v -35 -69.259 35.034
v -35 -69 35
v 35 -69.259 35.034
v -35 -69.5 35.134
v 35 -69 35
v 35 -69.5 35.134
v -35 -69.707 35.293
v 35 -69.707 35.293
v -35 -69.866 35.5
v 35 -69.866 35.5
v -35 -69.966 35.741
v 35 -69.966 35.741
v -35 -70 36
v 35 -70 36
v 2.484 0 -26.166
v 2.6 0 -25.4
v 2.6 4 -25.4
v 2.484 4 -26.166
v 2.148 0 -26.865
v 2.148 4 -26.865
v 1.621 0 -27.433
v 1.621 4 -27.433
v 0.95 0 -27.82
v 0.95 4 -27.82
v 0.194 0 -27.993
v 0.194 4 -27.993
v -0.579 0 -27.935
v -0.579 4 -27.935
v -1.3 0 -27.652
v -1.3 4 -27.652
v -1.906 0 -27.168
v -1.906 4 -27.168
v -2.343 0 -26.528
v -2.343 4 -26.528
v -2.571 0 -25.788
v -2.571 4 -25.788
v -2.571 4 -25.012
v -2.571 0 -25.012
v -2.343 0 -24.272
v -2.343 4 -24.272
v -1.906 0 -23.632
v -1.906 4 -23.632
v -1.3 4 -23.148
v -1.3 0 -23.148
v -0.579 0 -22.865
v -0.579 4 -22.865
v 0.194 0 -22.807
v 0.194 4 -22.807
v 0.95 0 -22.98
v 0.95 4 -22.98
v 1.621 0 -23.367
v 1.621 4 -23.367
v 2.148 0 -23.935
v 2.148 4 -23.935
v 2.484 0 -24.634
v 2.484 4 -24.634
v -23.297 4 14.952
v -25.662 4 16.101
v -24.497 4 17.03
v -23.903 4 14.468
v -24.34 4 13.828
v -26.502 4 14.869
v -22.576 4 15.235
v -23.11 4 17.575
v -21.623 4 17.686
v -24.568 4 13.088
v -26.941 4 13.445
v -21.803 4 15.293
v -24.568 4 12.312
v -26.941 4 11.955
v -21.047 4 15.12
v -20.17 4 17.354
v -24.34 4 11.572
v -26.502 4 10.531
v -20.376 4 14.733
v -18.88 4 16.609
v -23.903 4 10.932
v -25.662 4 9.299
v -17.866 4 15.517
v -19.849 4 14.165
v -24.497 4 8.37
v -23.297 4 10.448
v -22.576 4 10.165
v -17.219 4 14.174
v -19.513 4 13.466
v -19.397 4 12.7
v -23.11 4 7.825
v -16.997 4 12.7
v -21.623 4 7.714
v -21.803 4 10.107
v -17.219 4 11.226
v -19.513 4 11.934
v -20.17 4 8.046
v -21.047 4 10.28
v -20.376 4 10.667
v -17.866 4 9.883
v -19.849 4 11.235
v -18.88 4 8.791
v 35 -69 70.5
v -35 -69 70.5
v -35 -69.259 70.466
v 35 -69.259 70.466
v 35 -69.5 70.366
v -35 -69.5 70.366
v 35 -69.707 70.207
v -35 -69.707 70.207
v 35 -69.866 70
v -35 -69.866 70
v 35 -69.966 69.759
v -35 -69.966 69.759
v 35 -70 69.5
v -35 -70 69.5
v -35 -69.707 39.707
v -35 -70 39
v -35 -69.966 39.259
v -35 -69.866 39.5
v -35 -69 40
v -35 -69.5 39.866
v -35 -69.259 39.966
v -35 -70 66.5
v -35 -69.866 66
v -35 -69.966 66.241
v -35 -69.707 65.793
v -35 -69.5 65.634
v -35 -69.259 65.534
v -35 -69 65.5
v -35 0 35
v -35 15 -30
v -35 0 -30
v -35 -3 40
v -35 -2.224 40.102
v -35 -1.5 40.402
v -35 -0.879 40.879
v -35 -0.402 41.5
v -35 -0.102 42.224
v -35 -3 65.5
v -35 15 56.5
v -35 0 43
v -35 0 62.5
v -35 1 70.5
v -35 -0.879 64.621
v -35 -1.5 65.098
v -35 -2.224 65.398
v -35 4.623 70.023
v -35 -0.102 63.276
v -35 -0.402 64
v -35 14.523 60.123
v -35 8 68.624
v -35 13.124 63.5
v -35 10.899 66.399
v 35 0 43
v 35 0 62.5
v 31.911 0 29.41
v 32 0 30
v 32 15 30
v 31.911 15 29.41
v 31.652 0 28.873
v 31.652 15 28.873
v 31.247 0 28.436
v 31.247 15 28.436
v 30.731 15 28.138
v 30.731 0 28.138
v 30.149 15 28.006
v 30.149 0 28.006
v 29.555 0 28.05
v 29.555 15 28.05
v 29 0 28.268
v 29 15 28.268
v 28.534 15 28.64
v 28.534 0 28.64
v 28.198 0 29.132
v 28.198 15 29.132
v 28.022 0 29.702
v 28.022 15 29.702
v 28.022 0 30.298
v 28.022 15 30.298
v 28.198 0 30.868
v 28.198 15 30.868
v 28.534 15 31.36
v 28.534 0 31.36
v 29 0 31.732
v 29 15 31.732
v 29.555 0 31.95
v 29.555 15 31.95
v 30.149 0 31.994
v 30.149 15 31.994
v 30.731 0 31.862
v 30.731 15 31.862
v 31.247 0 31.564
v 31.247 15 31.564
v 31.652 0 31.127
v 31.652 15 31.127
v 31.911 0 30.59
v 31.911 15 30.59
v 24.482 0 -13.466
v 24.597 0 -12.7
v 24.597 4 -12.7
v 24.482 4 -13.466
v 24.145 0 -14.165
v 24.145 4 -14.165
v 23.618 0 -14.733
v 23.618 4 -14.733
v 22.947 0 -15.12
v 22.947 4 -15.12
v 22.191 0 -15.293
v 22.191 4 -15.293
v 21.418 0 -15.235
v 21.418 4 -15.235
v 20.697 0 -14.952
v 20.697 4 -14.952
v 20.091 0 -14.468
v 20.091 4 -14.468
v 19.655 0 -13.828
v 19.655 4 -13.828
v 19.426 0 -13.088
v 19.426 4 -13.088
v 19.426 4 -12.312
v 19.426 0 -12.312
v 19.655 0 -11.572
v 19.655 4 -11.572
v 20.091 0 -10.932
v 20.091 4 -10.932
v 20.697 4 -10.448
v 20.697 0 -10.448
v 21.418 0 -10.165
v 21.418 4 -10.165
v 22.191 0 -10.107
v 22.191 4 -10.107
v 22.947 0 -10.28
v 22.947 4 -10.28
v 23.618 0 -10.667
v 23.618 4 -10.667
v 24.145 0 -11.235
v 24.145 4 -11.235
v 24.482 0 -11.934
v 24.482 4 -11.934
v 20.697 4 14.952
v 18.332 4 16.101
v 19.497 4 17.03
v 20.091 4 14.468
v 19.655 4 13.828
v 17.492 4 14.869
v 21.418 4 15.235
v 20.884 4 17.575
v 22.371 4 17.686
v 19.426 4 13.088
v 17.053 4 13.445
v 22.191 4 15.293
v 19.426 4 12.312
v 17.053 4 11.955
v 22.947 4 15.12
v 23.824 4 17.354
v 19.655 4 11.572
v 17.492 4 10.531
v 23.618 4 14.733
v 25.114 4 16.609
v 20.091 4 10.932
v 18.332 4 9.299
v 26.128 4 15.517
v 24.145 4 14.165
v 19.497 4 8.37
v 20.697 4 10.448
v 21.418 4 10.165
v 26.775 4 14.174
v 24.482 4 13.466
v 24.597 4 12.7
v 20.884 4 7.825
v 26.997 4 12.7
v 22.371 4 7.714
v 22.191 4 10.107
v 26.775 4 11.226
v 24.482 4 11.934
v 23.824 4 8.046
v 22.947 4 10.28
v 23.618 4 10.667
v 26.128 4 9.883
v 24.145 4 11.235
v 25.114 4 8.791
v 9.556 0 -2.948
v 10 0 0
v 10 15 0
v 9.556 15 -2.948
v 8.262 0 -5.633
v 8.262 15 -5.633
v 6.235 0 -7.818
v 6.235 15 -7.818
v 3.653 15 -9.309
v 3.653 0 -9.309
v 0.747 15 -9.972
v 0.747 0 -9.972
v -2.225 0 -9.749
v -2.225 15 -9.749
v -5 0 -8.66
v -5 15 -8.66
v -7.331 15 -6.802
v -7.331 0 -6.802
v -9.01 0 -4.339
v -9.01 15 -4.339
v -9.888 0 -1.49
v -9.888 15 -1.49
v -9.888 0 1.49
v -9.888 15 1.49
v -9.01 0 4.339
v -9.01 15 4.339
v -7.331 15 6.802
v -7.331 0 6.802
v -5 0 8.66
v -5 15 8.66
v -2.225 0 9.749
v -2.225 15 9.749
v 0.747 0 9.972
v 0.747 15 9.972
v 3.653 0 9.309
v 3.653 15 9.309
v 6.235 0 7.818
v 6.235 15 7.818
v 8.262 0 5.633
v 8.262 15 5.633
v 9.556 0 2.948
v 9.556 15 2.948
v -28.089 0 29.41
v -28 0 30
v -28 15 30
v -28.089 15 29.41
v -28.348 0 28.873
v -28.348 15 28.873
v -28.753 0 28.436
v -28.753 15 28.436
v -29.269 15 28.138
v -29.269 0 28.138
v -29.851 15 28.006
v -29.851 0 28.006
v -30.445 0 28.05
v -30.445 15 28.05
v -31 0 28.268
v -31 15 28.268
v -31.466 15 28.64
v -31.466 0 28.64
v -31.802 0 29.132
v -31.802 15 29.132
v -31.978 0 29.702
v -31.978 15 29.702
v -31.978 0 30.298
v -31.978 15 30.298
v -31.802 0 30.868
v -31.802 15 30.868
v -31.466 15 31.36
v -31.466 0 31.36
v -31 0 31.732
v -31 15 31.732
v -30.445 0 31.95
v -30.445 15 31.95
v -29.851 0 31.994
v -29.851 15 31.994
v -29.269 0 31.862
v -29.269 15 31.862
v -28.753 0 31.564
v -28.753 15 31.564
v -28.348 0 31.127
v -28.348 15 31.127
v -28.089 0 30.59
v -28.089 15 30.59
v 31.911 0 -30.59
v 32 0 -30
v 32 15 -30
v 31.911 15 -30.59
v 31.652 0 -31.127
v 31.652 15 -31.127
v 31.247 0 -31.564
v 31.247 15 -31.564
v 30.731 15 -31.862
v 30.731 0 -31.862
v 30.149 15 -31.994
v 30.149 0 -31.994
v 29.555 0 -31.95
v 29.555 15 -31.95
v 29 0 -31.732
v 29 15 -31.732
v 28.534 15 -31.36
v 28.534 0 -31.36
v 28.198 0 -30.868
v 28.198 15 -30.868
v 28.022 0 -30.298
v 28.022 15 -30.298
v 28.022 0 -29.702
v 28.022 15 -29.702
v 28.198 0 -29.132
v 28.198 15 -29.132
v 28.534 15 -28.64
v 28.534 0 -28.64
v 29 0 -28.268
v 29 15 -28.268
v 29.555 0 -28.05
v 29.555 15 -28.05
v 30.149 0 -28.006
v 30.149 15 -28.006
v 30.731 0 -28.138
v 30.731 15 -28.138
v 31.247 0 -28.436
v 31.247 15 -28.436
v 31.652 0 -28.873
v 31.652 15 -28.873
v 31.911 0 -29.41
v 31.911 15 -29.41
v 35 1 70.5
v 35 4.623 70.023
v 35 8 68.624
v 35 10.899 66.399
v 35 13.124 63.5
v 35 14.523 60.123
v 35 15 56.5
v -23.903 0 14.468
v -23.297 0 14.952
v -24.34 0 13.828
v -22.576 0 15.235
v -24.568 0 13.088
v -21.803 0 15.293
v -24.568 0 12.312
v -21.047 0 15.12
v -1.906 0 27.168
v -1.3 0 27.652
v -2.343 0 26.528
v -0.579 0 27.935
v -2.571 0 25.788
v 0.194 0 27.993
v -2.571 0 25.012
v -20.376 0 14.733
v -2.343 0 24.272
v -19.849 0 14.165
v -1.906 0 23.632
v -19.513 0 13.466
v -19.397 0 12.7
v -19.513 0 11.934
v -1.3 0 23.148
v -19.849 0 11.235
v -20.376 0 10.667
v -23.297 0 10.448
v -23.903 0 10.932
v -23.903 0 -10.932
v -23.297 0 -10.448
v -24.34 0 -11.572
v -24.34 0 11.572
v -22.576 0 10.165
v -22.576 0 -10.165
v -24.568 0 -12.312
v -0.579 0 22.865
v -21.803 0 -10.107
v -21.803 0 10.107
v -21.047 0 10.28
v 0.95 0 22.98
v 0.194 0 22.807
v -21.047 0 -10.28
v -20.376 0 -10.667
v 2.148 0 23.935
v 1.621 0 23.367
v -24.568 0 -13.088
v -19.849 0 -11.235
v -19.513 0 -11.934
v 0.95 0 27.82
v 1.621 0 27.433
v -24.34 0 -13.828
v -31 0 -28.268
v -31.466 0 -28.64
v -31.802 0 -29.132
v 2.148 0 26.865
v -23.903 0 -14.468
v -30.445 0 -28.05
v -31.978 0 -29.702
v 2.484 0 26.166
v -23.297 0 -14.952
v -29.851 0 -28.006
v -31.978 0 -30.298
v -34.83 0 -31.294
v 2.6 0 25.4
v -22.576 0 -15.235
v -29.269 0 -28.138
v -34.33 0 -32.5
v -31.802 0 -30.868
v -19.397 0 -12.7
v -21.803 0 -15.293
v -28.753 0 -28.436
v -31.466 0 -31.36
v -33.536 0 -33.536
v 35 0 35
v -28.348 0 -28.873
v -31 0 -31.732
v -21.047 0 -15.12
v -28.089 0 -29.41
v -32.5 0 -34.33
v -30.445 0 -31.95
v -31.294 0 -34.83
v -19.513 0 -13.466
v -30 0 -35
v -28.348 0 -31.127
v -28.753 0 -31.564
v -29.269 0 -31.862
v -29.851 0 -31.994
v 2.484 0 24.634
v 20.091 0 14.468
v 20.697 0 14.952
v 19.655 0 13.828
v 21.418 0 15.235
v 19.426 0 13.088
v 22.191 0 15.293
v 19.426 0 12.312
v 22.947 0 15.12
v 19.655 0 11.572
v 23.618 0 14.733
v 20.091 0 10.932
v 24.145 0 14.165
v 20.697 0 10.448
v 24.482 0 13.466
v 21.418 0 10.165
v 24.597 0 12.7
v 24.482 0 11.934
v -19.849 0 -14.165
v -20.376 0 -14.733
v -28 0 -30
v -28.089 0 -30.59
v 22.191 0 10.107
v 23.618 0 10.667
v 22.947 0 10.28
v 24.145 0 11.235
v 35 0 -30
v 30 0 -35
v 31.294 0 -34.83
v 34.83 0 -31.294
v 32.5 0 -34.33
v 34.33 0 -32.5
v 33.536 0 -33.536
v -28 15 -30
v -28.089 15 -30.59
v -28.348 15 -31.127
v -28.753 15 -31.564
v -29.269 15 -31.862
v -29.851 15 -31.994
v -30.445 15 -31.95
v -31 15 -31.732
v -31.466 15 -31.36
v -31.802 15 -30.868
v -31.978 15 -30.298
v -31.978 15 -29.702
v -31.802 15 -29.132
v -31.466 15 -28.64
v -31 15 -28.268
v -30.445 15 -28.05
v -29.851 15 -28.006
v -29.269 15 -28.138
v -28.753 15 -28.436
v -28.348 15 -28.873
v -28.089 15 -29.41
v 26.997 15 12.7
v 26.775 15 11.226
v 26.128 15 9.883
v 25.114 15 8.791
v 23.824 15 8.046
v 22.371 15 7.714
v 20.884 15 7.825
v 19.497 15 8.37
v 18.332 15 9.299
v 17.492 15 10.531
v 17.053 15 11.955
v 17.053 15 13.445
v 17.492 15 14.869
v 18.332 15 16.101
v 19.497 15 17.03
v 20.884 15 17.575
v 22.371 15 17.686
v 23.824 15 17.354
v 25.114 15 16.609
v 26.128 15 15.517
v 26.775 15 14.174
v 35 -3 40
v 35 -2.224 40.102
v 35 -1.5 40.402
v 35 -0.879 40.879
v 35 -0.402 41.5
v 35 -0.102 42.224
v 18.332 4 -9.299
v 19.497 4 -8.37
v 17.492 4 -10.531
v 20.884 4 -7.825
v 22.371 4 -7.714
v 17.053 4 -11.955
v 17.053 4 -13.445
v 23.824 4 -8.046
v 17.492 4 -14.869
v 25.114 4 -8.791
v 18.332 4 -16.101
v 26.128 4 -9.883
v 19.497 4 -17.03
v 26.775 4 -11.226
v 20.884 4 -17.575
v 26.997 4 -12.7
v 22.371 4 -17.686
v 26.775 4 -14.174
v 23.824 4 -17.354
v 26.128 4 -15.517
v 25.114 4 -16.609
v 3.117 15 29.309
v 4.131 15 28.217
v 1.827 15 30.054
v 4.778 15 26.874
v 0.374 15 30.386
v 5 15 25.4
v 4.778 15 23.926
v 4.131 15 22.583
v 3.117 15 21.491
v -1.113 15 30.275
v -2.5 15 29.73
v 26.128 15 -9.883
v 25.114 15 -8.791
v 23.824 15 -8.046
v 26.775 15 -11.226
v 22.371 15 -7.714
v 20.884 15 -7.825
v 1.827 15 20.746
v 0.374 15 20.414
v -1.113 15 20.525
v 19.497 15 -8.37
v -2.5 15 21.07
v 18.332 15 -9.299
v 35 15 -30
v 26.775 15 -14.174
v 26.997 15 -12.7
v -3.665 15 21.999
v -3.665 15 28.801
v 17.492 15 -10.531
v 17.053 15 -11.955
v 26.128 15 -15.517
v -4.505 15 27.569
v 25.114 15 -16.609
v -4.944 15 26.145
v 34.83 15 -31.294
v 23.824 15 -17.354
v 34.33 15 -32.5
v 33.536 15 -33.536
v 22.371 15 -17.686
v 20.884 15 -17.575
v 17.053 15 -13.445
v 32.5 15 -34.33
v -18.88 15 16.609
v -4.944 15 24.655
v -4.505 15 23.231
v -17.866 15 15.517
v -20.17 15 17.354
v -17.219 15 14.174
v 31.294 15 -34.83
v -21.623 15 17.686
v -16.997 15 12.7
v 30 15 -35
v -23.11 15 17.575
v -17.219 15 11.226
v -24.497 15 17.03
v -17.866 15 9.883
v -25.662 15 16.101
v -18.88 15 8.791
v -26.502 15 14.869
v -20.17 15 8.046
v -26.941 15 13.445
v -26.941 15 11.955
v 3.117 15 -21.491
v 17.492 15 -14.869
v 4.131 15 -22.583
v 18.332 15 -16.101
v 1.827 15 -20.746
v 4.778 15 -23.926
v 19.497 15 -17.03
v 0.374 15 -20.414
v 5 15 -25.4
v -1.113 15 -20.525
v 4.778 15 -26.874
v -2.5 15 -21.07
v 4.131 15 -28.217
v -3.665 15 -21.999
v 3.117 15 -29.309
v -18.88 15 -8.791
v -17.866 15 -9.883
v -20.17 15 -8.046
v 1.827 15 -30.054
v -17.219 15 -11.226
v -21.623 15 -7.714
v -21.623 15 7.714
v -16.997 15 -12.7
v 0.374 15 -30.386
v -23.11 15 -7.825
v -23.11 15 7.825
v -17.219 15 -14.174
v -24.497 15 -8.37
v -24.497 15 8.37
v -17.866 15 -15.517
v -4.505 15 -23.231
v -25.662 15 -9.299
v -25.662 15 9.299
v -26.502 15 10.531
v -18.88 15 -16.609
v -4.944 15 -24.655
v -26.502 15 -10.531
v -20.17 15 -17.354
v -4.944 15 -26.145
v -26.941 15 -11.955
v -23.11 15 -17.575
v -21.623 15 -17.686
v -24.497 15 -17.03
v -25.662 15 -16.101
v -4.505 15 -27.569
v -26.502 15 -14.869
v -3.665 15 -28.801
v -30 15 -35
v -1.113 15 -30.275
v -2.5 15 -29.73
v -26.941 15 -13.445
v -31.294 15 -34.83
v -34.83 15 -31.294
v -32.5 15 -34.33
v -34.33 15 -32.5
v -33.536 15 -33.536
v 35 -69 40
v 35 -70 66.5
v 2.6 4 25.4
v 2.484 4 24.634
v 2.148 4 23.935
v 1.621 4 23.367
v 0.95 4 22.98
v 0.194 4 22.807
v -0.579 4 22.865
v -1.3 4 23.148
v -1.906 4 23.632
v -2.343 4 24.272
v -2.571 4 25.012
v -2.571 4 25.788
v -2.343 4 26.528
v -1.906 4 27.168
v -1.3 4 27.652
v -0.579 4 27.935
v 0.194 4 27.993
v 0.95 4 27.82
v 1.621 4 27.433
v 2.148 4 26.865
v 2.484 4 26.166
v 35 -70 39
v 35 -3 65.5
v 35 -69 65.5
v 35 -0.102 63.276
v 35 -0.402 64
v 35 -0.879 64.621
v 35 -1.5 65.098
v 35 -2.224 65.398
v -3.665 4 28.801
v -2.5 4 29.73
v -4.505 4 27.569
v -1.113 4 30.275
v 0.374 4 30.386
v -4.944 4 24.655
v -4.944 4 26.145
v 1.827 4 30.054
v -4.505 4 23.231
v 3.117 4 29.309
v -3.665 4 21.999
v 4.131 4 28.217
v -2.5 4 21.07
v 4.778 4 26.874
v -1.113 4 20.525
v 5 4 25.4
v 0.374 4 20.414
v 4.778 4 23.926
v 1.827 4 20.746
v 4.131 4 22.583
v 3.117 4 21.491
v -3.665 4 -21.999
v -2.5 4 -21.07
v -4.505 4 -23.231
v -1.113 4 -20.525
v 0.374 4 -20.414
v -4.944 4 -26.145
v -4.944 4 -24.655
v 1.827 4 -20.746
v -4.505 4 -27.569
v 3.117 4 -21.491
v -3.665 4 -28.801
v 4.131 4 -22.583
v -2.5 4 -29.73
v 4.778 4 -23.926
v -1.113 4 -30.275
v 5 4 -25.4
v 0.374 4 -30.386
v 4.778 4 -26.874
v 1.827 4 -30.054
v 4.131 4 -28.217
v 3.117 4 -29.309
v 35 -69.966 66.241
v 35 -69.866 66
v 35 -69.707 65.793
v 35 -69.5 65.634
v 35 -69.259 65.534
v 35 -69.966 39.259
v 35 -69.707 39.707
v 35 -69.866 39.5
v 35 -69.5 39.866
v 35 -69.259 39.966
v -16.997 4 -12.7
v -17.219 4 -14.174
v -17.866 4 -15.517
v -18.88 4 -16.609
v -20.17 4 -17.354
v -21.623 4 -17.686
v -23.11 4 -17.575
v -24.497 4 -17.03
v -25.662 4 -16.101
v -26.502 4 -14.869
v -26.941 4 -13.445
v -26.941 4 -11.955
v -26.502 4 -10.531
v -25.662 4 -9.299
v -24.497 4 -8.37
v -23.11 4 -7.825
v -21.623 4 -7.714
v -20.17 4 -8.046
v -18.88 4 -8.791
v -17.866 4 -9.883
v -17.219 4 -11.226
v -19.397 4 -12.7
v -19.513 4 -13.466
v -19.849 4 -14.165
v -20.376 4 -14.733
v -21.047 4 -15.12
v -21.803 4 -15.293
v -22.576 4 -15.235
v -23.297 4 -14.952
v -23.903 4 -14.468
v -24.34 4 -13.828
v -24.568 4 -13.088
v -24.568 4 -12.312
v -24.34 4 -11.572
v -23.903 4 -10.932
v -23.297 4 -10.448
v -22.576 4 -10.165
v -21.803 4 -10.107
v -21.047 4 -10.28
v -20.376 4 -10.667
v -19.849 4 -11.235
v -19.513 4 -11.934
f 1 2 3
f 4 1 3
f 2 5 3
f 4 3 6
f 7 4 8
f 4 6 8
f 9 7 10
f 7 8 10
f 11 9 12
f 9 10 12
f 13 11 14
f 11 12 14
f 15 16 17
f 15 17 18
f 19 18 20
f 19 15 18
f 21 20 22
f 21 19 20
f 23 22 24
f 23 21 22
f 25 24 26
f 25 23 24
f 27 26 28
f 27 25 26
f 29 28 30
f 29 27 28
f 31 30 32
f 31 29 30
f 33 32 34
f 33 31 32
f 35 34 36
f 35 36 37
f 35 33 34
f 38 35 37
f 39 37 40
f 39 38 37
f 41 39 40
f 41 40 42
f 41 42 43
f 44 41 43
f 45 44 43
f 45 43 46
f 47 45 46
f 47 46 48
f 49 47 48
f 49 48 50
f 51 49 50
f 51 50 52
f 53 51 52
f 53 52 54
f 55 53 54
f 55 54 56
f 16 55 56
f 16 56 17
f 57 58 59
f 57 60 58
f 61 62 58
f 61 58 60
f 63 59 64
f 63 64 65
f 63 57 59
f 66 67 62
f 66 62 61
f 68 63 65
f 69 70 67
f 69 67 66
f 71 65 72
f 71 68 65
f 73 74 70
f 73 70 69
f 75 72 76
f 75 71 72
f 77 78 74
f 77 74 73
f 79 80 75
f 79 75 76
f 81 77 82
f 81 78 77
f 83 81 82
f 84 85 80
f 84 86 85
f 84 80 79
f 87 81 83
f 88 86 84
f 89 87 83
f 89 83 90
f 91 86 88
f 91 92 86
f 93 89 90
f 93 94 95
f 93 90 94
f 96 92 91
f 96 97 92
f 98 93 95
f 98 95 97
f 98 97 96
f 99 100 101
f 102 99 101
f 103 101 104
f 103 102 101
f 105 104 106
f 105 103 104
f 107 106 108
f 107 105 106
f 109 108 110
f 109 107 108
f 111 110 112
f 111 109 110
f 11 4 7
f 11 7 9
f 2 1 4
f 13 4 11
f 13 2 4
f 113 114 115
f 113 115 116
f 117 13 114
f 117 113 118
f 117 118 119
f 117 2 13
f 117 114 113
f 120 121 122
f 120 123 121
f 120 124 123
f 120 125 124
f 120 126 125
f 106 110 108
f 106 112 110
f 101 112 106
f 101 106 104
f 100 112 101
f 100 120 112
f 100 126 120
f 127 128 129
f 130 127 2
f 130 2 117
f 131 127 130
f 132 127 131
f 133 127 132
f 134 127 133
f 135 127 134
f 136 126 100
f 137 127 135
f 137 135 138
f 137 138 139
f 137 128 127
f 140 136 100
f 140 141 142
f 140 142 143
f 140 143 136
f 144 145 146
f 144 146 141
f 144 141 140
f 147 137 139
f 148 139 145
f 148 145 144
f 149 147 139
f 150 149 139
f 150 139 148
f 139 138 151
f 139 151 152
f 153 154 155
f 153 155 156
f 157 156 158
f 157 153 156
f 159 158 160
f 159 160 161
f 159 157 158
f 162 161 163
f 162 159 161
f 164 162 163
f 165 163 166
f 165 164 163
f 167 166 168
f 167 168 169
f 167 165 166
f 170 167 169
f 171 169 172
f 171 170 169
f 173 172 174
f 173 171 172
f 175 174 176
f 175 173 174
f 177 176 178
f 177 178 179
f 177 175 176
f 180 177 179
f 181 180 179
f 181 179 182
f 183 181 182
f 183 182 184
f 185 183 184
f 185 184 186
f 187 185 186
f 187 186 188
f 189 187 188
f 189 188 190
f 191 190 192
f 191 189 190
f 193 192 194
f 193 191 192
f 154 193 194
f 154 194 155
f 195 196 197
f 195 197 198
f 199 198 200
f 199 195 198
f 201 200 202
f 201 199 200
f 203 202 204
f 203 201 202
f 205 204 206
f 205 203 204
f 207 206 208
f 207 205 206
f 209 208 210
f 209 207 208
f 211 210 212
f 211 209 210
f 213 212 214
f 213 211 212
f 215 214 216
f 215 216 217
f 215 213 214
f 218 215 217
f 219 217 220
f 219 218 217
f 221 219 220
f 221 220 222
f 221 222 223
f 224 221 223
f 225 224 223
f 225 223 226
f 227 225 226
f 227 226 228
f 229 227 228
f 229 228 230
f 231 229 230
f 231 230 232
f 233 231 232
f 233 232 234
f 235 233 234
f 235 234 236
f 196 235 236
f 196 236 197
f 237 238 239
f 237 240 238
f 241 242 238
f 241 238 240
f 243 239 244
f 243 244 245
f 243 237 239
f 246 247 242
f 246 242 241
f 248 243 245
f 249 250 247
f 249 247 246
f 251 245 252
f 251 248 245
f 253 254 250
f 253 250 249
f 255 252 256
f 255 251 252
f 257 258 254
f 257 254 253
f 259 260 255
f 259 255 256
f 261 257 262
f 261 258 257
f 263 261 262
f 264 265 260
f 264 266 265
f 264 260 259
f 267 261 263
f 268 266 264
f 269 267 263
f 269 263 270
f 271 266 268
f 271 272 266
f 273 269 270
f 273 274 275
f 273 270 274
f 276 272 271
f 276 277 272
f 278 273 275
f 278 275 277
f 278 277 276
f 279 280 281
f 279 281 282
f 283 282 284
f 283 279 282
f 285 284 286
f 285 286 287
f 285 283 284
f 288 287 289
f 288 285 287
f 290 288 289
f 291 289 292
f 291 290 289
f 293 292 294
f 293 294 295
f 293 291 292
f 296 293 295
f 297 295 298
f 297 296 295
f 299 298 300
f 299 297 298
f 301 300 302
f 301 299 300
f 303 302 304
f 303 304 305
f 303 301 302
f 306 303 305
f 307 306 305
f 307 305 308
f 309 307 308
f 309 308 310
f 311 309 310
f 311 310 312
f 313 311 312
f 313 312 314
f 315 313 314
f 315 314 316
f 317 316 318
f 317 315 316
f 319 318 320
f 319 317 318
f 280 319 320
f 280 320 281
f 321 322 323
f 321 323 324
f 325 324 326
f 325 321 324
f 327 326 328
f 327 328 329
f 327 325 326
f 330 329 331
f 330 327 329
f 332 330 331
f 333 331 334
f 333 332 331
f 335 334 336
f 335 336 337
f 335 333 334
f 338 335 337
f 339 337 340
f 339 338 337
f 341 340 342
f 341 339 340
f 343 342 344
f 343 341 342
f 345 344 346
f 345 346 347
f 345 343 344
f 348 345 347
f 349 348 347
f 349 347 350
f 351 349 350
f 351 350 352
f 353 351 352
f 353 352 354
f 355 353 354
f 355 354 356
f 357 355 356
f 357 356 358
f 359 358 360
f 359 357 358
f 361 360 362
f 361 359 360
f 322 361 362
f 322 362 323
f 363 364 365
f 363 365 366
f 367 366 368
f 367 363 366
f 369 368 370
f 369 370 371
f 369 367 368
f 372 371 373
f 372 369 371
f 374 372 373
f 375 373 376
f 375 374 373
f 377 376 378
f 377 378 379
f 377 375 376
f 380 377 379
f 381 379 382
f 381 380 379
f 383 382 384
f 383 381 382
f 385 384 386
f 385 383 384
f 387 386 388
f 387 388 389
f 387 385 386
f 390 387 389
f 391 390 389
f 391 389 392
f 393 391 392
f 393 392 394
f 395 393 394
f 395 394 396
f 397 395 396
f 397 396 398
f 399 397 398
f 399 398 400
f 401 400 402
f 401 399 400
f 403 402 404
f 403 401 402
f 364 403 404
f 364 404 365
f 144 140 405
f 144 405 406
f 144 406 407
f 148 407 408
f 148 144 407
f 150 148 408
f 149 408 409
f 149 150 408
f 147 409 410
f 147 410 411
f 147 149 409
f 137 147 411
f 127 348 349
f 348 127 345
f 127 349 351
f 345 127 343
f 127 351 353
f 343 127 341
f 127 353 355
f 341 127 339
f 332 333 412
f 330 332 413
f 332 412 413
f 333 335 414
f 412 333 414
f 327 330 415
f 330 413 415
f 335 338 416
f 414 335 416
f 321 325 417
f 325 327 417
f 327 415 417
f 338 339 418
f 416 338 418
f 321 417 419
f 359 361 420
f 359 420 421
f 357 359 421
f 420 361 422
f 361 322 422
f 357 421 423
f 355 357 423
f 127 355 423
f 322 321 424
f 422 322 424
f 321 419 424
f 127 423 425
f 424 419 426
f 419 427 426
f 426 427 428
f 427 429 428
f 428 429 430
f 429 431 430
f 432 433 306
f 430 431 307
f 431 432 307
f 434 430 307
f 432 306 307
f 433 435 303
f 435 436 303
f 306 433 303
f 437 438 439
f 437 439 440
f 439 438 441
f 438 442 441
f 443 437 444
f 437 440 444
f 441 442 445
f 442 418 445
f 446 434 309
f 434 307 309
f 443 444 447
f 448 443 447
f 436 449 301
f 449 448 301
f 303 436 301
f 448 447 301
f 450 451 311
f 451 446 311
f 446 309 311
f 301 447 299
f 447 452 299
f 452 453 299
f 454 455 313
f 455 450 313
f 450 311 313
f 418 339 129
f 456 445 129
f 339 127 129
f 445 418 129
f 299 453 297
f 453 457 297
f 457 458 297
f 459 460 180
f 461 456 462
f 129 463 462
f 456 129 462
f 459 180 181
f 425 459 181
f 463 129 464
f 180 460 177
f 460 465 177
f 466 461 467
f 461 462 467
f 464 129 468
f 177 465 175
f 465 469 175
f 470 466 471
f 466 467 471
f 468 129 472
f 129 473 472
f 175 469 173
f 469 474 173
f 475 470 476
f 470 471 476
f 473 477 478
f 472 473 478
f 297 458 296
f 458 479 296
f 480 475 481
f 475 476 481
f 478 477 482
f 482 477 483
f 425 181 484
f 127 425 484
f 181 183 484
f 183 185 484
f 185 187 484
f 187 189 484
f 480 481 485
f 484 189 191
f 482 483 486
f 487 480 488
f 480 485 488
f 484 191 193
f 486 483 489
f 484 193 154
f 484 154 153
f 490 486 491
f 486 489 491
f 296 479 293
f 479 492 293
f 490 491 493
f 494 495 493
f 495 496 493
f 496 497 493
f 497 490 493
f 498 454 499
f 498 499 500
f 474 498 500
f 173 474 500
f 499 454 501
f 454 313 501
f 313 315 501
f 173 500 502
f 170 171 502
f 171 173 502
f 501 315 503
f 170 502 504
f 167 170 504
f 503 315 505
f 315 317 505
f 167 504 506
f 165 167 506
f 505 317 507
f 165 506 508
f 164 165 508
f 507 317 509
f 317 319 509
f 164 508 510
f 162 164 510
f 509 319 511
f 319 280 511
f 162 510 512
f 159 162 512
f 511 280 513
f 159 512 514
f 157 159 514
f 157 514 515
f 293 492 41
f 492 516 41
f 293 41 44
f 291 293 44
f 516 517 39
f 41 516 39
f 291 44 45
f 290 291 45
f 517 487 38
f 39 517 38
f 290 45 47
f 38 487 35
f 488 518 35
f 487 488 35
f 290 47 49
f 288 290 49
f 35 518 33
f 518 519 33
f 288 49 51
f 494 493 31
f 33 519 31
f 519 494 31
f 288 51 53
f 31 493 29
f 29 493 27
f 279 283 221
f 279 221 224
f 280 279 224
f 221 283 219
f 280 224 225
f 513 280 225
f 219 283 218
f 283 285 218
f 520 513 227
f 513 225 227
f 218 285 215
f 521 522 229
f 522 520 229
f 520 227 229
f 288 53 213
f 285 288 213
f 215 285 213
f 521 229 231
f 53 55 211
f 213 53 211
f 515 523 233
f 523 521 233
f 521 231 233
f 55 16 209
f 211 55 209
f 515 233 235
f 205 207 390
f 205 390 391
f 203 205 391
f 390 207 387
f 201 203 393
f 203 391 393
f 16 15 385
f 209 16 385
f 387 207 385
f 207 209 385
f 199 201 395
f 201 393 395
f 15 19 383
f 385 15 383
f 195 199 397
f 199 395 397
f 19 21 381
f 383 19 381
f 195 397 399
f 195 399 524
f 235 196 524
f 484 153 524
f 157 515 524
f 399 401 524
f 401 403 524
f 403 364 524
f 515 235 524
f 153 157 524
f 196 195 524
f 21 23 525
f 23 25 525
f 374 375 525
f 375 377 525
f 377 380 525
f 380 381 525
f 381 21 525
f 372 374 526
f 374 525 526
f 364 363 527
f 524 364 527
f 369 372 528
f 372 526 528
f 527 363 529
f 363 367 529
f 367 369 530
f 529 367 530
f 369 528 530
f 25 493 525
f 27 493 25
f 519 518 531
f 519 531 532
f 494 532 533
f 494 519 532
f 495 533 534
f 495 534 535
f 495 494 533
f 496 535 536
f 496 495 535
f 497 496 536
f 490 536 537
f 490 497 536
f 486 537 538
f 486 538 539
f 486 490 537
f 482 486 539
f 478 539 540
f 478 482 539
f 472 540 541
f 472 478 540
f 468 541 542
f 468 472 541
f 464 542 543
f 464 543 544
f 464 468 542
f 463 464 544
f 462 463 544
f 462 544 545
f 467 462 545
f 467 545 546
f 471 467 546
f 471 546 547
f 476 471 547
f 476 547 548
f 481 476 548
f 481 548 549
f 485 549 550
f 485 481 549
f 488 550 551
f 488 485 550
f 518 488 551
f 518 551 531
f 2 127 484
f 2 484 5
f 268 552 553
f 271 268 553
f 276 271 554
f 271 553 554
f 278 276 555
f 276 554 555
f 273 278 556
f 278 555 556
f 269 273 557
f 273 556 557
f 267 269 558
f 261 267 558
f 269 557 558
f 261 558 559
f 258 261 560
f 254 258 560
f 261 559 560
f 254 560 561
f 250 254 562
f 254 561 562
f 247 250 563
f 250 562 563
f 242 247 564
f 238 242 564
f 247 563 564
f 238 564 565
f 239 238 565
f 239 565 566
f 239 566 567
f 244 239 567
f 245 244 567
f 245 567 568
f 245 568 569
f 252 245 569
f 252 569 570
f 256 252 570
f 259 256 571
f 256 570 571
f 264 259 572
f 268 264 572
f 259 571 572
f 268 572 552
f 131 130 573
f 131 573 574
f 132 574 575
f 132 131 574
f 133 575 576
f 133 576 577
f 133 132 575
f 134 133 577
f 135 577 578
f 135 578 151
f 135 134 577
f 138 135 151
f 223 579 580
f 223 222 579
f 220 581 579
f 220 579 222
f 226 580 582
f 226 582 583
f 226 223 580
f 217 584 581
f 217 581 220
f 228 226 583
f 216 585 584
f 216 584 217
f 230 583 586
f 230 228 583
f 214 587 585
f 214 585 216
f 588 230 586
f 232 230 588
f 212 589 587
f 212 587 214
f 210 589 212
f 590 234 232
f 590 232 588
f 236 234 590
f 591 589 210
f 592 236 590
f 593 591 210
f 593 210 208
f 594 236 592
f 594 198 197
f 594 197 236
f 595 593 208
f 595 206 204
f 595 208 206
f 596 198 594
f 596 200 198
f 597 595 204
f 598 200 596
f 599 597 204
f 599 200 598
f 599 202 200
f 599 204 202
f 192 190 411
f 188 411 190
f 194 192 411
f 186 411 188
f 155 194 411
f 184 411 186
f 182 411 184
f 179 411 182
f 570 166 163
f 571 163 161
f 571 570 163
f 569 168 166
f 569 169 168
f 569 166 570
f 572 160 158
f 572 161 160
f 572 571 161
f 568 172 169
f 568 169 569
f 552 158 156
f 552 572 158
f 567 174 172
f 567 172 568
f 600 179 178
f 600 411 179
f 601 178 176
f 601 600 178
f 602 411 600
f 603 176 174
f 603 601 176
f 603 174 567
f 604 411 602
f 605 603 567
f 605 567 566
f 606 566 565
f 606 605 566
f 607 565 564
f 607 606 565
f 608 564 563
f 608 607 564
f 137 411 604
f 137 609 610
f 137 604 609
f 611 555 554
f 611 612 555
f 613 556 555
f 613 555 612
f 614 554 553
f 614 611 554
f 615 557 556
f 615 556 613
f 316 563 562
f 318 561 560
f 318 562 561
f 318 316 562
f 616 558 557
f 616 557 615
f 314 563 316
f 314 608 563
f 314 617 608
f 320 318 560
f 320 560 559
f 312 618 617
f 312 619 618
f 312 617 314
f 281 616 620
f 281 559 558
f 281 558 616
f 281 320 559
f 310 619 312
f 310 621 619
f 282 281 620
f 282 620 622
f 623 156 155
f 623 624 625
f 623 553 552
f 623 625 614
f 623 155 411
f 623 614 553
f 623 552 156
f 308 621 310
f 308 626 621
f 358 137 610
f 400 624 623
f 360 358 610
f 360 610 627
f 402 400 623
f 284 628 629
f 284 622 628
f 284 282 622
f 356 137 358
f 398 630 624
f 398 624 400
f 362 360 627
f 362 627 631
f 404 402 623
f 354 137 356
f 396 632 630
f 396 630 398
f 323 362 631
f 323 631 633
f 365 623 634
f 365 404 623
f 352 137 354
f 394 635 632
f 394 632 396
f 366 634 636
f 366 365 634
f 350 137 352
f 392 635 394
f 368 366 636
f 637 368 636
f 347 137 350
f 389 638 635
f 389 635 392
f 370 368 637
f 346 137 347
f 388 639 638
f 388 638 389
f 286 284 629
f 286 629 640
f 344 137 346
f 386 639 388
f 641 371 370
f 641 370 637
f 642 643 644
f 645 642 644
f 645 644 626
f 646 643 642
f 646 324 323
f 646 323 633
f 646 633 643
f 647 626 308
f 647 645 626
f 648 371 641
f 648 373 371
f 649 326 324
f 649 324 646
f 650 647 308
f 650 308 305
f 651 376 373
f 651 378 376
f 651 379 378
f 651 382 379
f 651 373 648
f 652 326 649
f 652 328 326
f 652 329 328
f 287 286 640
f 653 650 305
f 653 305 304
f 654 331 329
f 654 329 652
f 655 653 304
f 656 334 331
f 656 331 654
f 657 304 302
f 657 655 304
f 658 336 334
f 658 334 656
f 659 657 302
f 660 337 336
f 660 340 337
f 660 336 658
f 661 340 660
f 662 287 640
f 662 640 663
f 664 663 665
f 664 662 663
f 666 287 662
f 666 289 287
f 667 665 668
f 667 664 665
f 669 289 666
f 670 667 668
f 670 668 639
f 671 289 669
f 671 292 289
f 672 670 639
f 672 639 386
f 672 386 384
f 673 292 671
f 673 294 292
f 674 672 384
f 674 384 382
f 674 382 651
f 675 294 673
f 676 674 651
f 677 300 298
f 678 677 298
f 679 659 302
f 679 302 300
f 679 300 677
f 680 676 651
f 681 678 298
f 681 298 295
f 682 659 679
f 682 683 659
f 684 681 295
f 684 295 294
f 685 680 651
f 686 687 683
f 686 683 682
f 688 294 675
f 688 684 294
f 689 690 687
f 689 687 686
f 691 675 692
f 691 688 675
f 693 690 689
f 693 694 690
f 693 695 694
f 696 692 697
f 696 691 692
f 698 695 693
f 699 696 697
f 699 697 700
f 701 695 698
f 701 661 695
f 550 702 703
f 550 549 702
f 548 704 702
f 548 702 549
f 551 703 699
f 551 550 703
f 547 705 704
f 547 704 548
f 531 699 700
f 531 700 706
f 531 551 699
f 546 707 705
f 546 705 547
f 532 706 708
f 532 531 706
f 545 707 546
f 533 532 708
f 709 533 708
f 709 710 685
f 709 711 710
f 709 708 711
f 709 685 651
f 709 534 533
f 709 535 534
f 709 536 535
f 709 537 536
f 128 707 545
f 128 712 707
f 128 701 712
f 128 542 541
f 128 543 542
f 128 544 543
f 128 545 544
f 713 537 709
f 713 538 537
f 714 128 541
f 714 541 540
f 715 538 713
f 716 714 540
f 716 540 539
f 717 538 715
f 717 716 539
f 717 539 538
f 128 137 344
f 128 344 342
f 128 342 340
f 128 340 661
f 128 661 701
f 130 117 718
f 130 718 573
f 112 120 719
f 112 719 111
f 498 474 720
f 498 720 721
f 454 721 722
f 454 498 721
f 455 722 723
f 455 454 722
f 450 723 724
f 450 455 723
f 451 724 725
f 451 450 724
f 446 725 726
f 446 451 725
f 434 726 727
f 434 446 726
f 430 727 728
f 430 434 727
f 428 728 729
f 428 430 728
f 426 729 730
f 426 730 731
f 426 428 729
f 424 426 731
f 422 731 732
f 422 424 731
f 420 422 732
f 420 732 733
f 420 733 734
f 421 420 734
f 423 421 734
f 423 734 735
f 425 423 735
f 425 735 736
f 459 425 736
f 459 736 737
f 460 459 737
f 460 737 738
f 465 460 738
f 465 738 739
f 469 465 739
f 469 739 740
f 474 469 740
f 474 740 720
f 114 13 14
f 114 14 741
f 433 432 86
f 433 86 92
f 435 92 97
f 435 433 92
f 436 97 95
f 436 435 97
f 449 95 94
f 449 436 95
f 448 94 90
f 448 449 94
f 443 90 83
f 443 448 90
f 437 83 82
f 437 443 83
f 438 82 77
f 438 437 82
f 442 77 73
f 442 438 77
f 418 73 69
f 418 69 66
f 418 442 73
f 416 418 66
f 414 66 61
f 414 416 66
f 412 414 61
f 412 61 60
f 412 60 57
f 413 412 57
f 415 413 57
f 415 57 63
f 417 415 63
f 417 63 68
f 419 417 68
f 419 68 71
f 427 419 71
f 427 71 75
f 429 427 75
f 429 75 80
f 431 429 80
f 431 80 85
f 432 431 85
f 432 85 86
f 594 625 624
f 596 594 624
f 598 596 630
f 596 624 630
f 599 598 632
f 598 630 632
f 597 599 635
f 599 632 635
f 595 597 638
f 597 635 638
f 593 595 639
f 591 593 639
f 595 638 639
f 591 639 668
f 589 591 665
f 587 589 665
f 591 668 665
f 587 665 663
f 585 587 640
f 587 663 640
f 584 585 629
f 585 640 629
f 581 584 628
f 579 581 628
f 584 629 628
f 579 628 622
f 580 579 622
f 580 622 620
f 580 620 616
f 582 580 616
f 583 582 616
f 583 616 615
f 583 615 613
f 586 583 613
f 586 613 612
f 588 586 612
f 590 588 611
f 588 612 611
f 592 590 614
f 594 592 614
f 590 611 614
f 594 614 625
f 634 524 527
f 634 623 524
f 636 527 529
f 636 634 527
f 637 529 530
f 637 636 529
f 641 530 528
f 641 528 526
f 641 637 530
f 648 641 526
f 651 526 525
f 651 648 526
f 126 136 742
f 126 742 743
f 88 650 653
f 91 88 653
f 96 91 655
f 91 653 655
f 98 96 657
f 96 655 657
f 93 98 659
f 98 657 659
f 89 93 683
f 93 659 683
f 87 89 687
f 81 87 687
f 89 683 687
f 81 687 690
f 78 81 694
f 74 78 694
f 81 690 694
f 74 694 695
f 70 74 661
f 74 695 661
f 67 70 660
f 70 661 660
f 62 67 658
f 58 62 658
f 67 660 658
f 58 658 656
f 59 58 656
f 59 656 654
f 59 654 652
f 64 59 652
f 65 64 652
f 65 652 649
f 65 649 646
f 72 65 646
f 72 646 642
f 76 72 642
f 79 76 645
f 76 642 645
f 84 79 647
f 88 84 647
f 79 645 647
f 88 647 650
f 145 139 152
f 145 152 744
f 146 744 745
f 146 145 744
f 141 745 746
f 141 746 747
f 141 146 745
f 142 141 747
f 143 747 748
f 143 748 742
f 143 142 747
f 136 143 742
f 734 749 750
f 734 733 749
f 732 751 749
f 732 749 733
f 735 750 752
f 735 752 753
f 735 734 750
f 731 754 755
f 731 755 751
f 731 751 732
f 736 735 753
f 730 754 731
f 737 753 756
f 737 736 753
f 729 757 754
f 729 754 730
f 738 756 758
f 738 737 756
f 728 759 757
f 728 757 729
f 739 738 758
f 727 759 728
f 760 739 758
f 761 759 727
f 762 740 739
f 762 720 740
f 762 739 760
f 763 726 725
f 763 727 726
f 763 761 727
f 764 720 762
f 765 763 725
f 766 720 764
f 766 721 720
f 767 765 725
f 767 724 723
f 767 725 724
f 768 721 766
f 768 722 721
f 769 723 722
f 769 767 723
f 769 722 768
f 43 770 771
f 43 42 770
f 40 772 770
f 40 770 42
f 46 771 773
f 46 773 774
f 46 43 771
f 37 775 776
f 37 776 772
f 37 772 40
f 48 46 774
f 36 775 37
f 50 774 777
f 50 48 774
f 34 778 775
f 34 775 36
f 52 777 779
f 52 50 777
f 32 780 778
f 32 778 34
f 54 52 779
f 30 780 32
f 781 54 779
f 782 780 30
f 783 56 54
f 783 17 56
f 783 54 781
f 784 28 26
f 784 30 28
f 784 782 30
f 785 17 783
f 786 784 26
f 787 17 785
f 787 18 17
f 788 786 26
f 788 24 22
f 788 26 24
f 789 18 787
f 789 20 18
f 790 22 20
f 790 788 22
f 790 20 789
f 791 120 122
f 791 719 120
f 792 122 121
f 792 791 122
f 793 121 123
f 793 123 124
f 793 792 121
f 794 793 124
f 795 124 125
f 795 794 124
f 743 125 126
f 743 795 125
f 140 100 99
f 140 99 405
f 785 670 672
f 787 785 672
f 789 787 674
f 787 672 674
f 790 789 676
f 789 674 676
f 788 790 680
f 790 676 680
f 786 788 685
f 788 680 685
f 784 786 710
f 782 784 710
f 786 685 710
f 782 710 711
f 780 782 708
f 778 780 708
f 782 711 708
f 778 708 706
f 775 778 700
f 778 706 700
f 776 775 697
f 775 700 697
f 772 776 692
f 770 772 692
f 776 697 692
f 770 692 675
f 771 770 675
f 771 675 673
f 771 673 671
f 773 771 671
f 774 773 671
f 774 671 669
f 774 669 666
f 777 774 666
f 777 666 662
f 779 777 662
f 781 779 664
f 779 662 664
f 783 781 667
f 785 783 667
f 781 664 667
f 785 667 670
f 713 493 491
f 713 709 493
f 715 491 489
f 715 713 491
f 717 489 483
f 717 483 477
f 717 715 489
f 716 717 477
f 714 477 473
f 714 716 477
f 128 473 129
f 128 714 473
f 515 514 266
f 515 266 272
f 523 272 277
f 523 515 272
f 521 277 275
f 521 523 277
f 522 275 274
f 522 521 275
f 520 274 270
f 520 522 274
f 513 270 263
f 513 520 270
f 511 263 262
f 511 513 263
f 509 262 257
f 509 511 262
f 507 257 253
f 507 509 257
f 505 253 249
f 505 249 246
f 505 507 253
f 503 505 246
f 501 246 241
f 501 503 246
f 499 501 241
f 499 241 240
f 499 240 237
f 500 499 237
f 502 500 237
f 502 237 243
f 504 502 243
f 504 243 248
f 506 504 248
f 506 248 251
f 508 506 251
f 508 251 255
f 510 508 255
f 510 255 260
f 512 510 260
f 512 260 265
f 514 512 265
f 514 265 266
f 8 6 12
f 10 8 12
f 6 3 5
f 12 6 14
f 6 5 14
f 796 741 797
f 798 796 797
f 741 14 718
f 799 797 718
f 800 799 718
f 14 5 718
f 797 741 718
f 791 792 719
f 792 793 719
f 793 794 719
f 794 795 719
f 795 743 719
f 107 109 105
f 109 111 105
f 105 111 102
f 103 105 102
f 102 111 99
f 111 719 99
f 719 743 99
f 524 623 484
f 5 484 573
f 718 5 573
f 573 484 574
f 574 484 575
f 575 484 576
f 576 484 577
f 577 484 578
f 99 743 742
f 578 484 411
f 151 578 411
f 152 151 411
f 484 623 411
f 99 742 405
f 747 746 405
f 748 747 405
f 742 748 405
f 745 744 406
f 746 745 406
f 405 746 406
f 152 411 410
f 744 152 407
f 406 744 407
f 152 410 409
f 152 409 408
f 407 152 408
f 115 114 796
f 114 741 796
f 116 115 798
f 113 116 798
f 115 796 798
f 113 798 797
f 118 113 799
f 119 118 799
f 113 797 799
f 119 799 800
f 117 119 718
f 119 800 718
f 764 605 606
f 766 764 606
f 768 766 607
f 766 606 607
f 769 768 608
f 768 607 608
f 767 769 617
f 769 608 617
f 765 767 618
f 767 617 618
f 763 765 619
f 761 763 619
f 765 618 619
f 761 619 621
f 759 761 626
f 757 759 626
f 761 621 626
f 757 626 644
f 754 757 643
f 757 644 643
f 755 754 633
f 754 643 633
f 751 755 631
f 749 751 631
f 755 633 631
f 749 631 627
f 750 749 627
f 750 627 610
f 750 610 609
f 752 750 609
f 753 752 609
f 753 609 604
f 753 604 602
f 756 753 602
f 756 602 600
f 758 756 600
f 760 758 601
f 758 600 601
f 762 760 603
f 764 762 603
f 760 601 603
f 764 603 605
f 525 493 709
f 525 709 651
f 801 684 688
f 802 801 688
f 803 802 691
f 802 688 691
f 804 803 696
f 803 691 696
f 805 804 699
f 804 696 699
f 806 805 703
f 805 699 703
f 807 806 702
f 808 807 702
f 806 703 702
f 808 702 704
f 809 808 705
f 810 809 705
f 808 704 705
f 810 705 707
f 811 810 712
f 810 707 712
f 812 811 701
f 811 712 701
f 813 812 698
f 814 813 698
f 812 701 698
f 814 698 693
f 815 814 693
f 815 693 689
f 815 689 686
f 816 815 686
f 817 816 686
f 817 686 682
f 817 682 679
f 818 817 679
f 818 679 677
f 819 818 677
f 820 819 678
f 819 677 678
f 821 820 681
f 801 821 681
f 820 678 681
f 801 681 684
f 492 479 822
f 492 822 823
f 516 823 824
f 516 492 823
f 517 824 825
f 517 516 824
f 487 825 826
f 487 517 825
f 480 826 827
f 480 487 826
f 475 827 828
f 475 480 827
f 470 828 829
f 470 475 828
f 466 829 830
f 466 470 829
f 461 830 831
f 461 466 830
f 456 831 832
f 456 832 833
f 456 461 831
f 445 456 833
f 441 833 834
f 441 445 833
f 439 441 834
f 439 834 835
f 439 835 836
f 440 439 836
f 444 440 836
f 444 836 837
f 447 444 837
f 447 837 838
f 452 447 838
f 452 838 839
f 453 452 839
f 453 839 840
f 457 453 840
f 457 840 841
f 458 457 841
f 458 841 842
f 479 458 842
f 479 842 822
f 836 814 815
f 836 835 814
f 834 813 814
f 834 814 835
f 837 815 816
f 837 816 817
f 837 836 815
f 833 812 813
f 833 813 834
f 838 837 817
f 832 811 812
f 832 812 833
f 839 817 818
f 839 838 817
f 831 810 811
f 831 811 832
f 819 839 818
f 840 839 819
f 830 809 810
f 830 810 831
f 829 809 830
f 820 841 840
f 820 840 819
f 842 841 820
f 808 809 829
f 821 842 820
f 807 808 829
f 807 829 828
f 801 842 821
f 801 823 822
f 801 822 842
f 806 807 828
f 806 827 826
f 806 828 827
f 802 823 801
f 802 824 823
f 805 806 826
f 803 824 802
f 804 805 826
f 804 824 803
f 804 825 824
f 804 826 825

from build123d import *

# Parameters (mm, degrees)
SKETCH1_W           = 70
SKETCH1_H           = 70
SKETCH1_R           = 2.6
SKETCH1_R_2         = 10
SKETCH1_R_3         = 2
BOSS_EXTRUDE1_DEPTH = 15
SKETCH2_R           = 5
SKETCH2_R_2         = 2.6
CUT_EXTRUDE1_DEPTH  = 11
BOSS_EXTRUDE2_DEPTH = 70
FILLET1_R           = 5
FILLET2_R           = 1


with BuildPart() as part:
    # Sketch1 → Boss-Extrude1 (new body)
    with BuildSketch(Plane(origin=(0, 0, 0), x_dir=(1, 0, 0), z_dir=(0, 1, 0))):
        Rectangle(SKETCH1_W, SKETCH1_H)
        with Locations((0, 25.4)):
            Circle(SKETCH1_R, mode=Mode.SUBTRACT)
        with Locations((21.997045256, 12.7)):
            Circle(SKETCH1_R, mode=Mode.SUBTRACT)
        with Locations((21.997045256, -12.7)):
            Circle(SKETCH1_R, mode=Mode.SUBTRACT)
        with Locations((0, -25.4)):
            Circle(SKETCH1_R, mode=Mode.SUBTRACT)
        with Locations((-21.997045256, -12.7)):
            Circle(SKETCH1_R, mode=Mode.SUBTRACT)
        with Locations((-21.997045256, 12.7)):
            Circle(SKETCH1_R, mode=Mode.SUBTRACT)
        Circle(SKETCH1_R_2, mode=Mode.SUBTRACT)
        with Locations((-30, 30)):
            Circle(SKETCH1_R_3, mode=Mode.SUBTRACT)
        with Locations((30, 30)):
            Circle(SKETCH1_R_3, mode=Mode.SUBTRACT)
        with Locations((30, -30)):
            Circle(SKETCH1_R_3, mode=Mode.SUBTRACT)
        with Locations((-30, -30)):
            Circle(SKETCH1_R_3, mode=Mode.SUBTRACT)
    extrude(amount=BOSS_EXTRUDE1_DEPTH)

    # Sketch2 → Cut-Extrude1 (cut)
    with BuildSketch(Plane(origin=(0, 15, 0), x_dir=(1, 0, 0), z_dir=(0, 1, 0))):
        with Locations((-21.997045256, -12.7)):
            Circle(SKETCH2_R)
        with Locations((-21.997045256, -12.7)):
            Circle(SKETCH2_R_2, mode=Mode.SUBTRACT)
        with Locations((0, -25.4)):
            Circle(SKETCH2_R)
        with Locations((0, -25.4)):
            Circle(SKETCH2_R_2, mode=Mode.SUBTRACT)
        with Locations((21.997045256, -12.7)):
            Circle(SKETCH2_R)
        with Locations((21.997045256, -12.7)):
            Circle(SKETCH2_R_2, mode=Mode.SUBTRACT)
        with Locations((21.997045256, 12.7)):
            Circle(SKETCH2_R)
        with Locations((21.997045256, 12.7)):
            Circle(SKETCH2_R_2, mode=Mode.SUBTRACT)
        with Locations((0, 25.4)):
            Circle(SKETCH2_R)
        with Locations((0, 25.4)):
            Circle(SKETCH2_R_2, mode=Mode.SUBTRACT)
        with Locations((-21.997045256, 12.7)):
            Circle(SKETCH2_R)
        with Locations((-21.997045256, 12.7)):
            Circle(SKETCH2_R_2, mode=Mode.SUBTRACT)
    extrude(amount=-CUT_EXTRUDE1_DEPTH, mode=Mode.SUBTRACT)

    # Sketch3 → Boss-Extrude2 (add)
    with BuildSketch(Plane.ZY.offset(35)):
        with BuildLine():
            Line((35, 0), (35, -70))
            Line((35, -70), (40, -70))
            Line((40, -70), (40, -3))
            ThreePointArc((40, -3), (40.878679656, -0.878679656), (43, 0))
            Line((43, 0), (62.5, 0))
            ThreePointArc((62.5, 0), (64.621320344, -0.878679656), (65.5, -3))
            Line((65.5, -3), (65.5, -70))
            Line((65.5, -70), (70.5, -70))
            Line((70.5, -70), (70.5, 0))
            Line((70.5, 0), (70.5, 1))
            ThreePointArc((70.5, 1), (66.399494937, 10.899494937), (56.5, 15))
            Line((56.5, 15), (35, 15))
            Line((35, 15), (35, 0))
        make_face()
    extrude(amount=-BOSS_EXTRUDE2_DEPTH)

    # Fillet1
    fillet1_edges = [part.edges().sort_by_distance(p)[0] for p in [
        (-35, 7.5, -35),
        (35, 7.5, -35),
    ]]
    fillet(fillet1_edges, radius=FILLET1_R)

    # Fillet2
    fillet2_edges = [part.edges().sort_by_distance(p)[0] for p in [
        (0, -70, 70.5),
        (0, -70, 65.5),
        (0, -70, 40),
        (0, -70, 35),
    ]]
    fillet(fillet2_edges, radius=FILLET2_R)


solid = part.part
